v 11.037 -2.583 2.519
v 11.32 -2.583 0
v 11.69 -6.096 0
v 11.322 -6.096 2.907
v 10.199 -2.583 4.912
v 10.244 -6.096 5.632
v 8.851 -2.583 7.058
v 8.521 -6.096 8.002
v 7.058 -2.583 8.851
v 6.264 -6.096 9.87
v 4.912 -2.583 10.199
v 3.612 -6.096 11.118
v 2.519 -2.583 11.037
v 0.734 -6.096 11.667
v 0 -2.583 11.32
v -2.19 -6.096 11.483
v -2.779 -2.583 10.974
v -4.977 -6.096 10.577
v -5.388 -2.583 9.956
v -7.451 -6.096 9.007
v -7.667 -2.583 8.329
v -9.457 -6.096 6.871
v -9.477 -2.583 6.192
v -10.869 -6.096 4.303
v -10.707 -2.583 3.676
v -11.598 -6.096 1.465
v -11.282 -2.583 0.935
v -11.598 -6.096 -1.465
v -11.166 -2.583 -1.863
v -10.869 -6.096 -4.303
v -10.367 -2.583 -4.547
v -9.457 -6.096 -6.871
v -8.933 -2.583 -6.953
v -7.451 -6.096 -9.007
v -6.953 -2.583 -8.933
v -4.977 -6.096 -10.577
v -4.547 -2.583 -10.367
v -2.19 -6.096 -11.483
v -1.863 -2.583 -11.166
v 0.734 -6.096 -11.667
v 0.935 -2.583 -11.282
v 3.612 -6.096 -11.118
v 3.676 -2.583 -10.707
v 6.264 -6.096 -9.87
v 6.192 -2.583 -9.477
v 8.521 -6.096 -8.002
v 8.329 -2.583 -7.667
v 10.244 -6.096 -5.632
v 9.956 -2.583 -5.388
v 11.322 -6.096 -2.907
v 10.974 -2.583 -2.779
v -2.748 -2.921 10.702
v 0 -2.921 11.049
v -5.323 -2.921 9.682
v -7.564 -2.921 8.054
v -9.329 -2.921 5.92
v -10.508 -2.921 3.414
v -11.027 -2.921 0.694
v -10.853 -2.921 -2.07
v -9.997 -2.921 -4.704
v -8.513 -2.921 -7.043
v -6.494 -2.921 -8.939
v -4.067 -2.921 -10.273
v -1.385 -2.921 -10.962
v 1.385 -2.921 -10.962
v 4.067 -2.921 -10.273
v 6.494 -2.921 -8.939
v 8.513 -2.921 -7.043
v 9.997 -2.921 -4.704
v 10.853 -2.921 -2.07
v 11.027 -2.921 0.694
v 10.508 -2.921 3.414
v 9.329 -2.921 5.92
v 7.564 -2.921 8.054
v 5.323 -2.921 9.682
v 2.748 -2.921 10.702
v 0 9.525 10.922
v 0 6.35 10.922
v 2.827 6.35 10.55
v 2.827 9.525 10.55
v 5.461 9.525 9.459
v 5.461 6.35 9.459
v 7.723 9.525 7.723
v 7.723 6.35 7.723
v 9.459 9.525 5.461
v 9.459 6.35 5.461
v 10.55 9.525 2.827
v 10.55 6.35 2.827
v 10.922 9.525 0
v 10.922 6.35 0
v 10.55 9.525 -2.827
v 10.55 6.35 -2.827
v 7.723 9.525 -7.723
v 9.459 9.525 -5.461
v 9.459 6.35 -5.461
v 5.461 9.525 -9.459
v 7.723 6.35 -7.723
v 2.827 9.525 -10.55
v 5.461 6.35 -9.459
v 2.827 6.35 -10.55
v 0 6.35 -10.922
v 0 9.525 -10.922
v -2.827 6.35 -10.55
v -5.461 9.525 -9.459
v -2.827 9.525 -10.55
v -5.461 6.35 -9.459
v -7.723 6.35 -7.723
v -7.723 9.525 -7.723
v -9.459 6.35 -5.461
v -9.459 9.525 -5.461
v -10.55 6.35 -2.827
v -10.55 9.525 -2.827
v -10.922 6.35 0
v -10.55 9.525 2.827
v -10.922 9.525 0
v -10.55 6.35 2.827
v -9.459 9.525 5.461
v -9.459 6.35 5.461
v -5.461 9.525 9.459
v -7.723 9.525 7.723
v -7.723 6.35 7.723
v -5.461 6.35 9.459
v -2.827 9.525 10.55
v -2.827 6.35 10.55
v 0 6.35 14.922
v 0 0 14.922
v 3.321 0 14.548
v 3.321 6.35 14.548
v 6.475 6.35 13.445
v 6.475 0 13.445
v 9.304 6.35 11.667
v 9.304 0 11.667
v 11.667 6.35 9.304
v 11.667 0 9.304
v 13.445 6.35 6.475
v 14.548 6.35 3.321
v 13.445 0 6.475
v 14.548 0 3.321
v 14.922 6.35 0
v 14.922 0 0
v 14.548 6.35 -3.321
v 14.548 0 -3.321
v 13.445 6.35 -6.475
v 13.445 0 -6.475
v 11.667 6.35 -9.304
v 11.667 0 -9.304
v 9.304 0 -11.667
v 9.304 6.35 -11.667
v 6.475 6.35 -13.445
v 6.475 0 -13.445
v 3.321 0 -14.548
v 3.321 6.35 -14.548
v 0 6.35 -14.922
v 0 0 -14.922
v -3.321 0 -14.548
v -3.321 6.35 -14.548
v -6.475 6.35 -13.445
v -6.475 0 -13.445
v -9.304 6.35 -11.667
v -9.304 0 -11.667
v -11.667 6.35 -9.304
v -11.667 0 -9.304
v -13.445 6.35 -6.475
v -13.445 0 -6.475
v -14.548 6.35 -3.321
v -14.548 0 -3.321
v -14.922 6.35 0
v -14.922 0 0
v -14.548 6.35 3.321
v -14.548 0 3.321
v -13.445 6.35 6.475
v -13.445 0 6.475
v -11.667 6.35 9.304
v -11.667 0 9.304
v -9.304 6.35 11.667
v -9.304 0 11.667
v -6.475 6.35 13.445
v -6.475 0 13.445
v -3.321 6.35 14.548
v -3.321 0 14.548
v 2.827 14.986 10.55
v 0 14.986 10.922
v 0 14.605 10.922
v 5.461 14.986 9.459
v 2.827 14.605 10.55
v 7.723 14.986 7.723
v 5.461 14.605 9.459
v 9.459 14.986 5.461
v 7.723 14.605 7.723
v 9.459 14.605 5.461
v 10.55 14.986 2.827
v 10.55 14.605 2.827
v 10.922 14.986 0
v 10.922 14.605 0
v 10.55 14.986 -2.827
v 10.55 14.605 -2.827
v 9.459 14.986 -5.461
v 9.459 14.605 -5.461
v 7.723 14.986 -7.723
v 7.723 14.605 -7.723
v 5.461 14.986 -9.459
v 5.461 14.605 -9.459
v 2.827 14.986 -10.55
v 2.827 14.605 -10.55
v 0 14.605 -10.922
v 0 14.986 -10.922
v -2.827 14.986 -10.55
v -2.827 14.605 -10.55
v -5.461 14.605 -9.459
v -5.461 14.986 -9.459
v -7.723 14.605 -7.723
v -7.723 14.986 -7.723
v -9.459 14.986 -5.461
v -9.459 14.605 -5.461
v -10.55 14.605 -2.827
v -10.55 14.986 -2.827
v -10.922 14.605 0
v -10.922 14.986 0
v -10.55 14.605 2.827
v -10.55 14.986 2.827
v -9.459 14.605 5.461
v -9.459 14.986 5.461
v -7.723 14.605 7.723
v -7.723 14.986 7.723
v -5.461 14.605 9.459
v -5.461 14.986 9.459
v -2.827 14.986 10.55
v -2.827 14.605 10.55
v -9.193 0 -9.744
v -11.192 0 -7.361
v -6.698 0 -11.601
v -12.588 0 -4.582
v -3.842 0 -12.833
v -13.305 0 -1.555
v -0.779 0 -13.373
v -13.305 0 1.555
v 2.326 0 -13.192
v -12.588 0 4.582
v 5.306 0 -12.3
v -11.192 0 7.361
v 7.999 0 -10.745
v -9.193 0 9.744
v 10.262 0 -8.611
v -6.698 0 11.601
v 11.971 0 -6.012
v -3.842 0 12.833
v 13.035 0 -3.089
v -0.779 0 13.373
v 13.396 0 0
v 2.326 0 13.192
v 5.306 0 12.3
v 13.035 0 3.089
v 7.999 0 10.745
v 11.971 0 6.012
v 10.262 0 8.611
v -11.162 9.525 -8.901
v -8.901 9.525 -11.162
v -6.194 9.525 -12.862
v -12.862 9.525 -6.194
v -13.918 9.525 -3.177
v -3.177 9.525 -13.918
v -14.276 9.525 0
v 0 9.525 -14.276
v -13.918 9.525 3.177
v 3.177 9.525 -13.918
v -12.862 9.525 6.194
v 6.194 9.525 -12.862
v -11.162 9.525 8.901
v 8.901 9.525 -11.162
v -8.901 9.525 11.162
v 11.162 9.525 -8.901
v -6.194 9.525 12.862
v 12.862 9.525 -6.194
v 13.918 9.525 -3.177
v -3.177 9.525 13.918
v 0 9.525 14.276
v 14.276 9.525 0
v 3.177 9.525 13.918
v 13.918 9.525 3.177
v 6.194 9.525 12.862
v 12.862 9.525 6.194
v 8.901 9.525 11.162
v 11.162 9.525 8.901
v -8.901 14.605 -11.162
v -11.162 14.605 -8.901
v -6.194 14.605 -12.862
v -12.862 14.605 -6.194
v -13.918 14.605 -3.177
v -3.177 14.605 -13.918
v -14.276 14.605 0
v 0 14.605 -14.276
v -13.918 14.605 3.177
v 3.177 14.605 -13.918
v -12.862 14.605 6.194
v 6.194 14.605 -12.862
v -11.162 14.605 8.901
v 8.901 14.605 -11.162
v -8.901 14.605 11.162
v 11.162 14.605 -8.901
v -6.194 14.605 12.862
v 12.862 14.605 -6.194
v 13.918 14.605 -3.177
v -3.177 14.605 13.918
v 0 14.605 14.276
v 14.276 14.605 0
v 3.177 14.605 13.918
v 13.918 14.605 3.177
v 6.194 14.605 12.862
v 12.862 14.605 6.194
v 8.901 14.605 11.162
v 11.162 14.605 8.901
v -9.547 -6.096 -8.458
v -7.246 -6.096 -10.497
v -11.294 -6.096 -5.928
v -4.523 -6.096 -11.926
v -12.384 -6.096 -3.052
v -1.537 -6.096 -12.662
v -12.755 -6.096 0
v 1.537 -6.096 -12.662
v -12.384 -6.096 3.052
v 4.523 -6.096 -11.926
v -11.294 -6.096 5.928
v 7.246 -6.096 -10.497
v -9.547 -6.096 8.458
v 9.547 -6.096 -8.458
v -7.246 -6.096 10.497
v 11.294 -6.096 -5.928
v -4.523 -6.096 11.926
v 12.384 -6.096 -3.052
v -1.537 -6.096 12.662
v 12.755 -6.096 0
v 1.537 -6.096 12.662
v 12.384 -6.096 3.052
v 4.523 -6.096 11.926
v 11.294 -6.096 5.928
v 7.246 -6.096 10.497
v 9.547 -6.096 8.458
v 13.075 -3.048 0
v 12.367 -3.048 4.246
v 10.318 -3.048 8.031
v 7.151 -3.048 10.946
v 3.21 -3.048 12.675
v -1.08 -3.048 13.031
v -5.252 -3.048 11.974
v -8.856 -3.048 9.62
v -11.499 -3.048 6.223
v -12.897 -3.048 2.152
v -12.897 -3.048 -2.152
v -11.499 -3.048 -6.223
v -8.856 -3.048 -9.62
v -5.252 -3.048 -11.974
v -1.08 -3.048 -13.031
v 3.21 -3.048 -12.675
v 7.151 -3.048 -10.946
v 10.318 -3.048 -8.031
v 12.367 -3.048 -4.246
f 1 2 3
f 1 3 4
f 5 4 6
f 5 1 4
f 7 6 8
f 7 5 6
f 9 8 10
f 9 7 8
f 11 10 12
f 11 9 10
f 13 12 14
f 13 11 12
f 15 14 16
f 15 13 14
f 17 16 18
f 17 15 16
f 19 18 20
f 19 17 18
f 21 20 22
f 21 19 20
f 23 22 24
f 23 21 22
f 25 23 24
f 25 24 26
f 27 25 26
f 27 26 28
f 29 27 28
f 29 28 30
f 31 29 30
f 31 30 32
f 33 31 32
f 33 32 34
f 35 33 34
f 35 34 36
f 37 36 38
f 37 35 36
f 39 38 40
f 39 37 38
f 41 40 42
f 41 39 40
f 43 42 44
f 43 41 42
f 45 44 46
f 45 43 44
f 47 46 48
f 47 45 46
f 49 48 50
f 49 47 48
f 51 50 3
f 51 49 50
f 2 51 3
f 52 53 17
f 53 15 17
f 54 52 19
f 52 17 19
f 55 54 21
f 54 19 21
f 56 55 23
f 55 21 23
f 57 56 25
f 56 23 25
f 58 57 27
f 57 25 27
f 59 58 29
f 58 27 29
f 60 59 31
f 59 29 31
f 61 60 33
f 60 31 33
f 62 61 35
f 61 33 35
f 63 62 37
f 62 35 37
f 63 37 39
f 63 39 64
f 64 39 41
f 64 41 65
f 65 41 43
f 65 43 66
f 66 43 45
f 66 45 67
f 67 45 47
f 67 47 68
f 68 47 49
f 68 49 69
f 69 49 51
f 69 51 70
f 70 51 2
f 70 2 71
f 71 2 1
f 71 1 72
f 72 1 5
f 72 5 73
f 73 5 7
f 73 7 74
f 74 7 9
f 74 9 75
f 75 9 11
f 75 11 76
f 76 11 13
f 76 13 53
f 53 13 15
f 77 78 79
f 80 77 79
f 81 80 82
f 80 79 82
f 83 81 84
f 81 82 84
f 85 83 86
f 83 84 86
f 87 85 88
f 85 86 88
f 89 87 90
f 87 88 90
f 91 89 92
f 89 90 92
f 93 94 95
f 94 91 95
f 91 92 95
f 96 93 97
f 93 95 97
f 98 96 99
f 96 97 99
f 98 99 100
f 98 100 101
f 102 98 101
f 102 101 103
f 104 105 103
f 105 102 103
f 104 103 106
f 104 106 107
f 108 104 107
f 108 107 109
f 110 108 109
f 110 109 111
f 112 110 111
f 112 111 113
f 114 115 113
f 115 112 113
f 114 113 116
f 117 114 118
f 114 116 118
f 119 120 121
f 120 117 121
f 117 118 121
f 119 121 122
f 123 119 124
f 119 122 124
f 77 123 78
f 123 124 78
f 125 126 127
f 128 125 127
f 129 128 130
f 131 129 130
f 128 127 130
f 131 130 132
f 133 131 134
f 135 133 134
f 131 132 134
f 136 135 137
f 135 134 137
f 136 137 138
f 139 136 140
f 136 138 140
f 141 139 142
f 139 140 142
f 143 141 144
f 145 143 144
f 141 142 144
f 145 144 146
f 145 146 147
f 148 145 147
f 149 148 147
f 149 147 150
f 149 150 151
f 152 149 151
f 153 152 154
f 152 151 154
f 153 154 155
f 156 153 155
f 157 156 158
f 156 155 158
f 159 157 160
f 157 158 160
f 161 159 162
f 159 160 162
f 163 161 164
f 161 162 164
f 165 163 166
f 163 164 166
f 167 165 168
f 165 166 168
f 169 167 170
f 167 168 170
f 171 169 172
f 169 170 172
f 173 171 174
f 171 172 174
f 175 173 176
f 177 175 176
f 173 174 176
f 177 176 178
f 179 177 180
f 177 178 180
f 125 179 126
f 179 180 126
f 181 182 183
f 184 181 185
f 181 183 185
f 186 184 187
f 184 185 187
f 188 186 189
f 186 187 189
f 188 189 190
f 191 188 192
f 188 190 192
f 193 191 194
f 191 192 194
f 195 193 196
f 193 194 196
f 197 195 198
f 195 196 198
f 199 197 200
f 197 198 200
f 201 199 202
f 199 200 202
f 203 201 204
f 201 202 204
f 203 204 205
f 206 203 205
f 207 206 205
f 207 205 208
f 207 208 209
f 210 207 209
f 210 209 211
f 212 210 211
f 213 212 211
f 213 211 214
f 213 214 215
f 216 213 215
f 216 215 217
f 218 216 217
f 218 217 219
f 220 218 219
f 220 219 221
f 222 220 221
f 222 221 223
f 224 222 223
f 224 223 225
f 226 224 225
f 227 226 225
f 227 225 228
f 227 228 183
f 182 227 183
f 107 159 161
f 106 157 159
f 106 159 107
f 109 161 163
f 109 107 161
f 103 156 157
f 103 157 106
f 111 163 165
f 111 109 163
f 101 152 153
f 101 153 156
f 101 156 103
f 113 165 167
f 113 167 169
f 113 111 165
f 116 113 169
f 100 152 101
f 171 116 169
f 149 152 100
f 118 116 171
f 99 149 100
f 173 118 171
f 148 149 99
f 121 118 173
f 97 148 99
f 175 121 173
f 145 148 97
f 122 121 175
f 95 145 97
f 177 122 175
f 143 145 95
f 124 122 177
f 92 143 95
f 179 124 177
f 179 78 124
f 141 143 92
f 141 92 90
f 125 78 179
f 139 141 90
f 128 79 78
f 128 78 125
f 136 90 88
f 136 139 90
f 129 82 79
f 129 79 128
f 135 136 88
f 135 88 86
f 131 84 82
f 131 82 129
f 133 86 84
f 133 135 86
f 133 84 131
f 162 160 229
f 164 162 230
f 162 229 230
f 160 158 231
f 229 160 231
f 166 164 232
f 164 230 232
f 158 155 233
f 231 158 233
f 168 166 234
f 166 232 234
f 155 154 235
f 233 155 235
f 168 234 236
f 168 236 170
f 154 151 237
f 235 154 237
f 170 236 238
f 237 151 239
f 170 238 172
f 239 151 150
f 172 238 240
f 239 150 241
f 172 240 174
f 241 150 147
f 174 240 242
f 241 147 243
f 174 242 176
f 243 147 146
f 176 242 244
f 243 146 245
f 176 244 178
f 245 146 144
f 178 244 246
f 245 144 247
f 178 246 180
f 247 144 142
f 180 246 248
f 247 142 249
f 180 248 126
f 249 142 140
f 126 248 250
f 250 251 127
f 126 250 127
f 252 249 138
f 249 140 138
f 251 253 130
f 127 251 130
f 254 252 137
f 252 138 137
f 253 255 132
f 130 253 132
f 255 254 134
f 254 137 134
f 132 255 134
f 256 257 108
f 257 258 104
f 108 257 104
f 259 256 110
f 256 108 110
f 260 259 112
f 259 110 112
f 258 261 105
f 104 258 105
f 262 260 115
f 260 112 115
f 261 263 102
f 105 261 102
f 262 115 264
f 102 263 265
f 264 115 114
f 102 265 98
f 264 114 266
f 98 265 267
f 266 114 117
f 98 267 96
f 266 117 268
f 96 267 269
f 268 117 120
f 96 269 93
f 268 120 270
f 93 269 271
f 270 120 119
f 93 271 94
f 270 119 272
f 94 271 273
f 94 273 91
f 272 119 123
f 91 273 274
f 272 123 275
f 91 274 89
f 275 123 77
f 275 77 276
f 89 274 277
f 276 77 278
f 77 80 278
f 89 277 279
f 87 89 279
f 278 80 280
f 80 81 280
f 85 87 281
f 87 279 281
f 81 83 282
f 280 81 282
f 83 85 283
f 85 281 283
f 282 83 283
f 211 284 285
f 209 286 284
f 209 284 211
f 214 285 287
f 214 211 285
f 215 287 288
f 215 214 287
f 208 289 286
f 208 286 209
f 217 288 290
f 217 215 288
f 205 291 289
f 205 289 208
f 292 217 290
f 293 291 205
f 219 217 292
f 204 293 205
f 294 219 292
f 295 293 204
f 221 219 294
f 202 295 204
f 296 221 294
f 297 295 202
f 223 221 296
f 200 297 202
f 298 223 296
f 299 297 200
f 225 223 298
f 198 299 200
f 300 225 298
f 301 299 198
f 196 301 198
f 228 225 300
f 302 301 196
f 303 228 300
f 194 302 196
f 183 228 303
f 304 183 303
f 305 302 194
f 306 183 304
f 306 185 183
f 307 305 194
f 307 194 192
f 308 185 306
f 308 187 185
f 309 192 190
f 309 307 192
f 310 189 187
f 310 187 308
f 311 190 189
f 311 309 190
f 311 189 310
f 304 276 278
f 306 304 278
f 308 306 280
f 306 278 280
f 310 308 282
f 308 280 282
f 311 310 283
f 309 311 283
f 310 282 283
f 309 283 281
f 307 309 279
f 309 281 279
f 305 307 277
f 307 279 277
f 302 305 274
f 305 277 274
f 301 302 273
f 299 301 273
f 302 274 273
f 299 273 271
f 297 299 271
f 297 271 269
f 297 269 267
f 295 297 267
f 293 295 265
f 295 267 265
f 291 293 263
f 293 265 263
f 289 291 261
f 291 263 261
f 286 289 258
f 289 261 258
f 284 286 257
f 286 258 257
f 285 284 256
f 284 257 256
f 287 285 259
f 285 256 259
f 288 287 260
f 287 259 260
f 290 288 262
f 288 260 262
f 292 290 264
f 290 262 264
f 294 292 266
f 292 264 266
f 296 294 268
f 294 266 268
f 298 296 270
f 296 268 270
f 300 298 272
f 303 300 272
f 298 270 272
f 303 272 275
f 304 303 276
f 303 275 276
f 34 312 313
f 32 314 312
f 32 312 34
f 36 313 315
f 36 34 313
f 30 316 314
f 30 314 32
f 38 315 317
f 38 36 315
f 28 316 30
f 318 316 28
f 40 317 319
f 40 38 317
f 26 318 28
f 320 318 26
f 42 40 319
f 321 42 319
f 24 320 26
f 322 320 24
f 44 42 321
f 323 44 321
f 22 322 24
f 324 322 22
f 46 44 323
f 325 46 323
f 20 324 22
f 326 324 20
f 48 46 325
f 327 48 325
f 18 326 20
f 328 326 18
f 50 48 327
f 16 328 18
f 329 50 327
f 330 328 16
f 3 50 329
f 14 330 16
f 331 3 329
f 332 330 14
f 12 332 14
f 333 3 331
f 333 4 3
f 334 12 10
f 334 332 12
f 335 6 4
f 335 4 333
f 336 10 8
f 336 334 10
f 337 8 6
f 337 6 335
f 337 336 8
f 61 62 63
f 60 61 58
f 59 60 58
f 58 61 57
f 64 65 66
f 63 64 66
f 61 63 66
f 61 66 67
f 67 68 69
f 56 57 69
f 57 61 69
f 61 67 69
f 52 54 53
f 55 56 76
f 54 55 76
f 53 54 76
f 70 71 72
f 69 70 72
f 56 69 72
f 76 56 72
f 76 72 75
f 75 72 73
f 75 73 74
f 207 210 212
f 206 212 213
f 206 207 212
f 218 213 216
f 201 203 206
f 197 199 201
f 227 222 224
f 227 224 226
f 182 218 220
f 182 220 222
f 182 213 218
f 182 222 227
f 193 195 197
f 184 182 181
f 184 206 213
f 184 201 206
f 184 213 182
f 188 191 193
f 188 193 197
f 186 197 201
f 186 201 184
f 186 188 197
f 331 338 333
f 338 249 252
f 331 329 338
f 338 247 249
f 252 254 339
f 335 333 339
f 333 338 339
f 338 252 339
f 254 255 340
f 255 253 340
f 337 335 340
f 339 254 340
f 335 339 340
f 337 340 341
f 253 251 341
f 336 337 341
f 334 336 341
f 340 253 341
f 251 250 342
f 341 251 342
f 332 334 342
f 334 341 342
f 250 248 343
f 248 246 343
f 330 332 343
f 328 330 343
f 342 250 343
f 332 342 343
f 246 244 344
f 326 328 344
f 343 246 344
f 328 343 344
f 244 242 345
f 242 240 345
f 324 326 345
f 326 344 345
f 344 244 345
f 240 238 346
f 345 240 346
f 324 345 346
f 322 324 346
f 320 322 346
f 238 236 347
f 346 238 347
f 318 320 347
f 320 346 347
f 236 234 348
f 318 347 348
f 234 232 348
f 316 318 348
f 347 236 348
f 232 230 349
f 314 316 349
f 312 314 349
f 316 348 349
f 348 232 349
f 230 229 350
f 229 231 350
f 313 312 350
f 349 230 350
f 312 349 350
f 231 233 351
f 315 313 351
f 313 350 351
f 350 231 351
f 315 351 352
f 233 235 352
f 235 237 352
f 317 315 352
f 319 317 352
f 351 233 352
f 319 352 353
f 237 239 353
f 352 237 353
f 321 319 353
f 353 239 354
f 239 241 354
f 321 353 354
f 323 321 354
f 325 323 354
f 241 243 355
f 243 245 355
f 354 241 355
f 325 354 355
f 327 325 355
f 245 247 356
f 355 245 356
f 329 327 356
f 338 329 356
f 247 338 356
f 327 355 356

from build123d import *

# Parameters (mm, degrees)
SKETCH1_R      = 14.9225
EXTRUDE1_DEPTH = 6.35
SKETCH3_R      = 11.049
EXTRUDE2_DEPTH = 9.271
SKETCH5_R      = 10.922
EXTRUDE3_DEPTH = 8.636
SKETCH6_R      = 14.27627633
EXTRUDE4_DEPTH = 5.08
SKETCH7_R      = 13.395629592
SKETCH7_R_2    = 11.049
EXTRUDE5_DEPTH = 6.096
EXTRUDE5_DRAFT = 6


with BuildPart() as part:
    # Sketch1 → Extrude1 (new body)
    with BuildSketch(Plane(origin=(0, 0, 0), x_dir=(1, 0, 0), z_dir=(0, 1, 0))):
        with Locations(Location((0, 0, 0), (0, 0, 270))):
            Circle(SKETCH1_R)
    extrude(amount=EXTRUDE1_DEPTH)

    # Sketch3 → Extrude2 (add)
    with BuildSketch(Plane(origin=(0, -2.921, 0), x_dir=(0, 0, -1), z_dir=(0, 1, 0))):
        with Locations(Location((0, 0, 0), (0, 0, 180))):
            Circle(SKETCH3_R)
    extrude(amount=EXTRUDE2_DEPTH)

    # Sketch4 → Revolve1 (revolve)
    with BuildSketch(Plane(origin=(0, 0, 0), x_dir=(0, 0, 1), z_dir=(1, 0, 0)), mode=Mode.PRIVATE) as revolve1_sk:
        Polygon((-11.049, 2.921), (-14.336865125, -1.171616093), (-11.049, -1.171616093), align=None)
    revolve(revolve1_sk.sketch.rotate(Axis((0, 1.376246897, 0), (0, -1, 0)), 180), axis=Axis((0, 1.376246897, 0), (0, -1, 0)))

    # Sketch5 → Extrude3 (add)
    with BuildSketch(Plane(origin=(0, 6.35, 0), x_dir=(-1, 0, 0), z_dir=(0, 1, 0))):
        with Locations(Location((0, 0, 0), (0, 0, 90))):
            Circle(SKETCH5_R)
    extrude(amount=EXTRUDE3_DEPTH)

    # Sketch6 → Extrude4 (add)
    with BuildSketch(Plane.ZX.offset(9.525)):
        Circle(SKETCH6_R)
    extrude(amount=EXTRUDE4_DEPTH)


with BuildPart() as extrude5_tool:
    # Sketch7 → Extrude5 (with draft: the straight prism first)
    with BuildSketch(Plane.XZ):
        Circle(SKETCH7_R)
        Circle(SKETCH7_R_2, mode=Mode.SUBTRACT)
    extrude(amount=EXTRUDE5_DEPTH)
    # Extrude5: the draft: its side faces are tilted about the plane it starts from
    extrude5_sides = [extrude5_tool.faces().sort_by_distance(p)[0] for p in [
        (-13.395629592, -3.048, 0),
        (-11.049, -3.048, 0),
    ]]
    draft(extrude5_sides, Plane.XZ, EXTRUDE5_DRAFT)


with BuildPart() as part_1:
    add(part.part)

    # Extrude5: add extrude5_tool
    add(extrude5_tool.part)


solid = part_1.part
